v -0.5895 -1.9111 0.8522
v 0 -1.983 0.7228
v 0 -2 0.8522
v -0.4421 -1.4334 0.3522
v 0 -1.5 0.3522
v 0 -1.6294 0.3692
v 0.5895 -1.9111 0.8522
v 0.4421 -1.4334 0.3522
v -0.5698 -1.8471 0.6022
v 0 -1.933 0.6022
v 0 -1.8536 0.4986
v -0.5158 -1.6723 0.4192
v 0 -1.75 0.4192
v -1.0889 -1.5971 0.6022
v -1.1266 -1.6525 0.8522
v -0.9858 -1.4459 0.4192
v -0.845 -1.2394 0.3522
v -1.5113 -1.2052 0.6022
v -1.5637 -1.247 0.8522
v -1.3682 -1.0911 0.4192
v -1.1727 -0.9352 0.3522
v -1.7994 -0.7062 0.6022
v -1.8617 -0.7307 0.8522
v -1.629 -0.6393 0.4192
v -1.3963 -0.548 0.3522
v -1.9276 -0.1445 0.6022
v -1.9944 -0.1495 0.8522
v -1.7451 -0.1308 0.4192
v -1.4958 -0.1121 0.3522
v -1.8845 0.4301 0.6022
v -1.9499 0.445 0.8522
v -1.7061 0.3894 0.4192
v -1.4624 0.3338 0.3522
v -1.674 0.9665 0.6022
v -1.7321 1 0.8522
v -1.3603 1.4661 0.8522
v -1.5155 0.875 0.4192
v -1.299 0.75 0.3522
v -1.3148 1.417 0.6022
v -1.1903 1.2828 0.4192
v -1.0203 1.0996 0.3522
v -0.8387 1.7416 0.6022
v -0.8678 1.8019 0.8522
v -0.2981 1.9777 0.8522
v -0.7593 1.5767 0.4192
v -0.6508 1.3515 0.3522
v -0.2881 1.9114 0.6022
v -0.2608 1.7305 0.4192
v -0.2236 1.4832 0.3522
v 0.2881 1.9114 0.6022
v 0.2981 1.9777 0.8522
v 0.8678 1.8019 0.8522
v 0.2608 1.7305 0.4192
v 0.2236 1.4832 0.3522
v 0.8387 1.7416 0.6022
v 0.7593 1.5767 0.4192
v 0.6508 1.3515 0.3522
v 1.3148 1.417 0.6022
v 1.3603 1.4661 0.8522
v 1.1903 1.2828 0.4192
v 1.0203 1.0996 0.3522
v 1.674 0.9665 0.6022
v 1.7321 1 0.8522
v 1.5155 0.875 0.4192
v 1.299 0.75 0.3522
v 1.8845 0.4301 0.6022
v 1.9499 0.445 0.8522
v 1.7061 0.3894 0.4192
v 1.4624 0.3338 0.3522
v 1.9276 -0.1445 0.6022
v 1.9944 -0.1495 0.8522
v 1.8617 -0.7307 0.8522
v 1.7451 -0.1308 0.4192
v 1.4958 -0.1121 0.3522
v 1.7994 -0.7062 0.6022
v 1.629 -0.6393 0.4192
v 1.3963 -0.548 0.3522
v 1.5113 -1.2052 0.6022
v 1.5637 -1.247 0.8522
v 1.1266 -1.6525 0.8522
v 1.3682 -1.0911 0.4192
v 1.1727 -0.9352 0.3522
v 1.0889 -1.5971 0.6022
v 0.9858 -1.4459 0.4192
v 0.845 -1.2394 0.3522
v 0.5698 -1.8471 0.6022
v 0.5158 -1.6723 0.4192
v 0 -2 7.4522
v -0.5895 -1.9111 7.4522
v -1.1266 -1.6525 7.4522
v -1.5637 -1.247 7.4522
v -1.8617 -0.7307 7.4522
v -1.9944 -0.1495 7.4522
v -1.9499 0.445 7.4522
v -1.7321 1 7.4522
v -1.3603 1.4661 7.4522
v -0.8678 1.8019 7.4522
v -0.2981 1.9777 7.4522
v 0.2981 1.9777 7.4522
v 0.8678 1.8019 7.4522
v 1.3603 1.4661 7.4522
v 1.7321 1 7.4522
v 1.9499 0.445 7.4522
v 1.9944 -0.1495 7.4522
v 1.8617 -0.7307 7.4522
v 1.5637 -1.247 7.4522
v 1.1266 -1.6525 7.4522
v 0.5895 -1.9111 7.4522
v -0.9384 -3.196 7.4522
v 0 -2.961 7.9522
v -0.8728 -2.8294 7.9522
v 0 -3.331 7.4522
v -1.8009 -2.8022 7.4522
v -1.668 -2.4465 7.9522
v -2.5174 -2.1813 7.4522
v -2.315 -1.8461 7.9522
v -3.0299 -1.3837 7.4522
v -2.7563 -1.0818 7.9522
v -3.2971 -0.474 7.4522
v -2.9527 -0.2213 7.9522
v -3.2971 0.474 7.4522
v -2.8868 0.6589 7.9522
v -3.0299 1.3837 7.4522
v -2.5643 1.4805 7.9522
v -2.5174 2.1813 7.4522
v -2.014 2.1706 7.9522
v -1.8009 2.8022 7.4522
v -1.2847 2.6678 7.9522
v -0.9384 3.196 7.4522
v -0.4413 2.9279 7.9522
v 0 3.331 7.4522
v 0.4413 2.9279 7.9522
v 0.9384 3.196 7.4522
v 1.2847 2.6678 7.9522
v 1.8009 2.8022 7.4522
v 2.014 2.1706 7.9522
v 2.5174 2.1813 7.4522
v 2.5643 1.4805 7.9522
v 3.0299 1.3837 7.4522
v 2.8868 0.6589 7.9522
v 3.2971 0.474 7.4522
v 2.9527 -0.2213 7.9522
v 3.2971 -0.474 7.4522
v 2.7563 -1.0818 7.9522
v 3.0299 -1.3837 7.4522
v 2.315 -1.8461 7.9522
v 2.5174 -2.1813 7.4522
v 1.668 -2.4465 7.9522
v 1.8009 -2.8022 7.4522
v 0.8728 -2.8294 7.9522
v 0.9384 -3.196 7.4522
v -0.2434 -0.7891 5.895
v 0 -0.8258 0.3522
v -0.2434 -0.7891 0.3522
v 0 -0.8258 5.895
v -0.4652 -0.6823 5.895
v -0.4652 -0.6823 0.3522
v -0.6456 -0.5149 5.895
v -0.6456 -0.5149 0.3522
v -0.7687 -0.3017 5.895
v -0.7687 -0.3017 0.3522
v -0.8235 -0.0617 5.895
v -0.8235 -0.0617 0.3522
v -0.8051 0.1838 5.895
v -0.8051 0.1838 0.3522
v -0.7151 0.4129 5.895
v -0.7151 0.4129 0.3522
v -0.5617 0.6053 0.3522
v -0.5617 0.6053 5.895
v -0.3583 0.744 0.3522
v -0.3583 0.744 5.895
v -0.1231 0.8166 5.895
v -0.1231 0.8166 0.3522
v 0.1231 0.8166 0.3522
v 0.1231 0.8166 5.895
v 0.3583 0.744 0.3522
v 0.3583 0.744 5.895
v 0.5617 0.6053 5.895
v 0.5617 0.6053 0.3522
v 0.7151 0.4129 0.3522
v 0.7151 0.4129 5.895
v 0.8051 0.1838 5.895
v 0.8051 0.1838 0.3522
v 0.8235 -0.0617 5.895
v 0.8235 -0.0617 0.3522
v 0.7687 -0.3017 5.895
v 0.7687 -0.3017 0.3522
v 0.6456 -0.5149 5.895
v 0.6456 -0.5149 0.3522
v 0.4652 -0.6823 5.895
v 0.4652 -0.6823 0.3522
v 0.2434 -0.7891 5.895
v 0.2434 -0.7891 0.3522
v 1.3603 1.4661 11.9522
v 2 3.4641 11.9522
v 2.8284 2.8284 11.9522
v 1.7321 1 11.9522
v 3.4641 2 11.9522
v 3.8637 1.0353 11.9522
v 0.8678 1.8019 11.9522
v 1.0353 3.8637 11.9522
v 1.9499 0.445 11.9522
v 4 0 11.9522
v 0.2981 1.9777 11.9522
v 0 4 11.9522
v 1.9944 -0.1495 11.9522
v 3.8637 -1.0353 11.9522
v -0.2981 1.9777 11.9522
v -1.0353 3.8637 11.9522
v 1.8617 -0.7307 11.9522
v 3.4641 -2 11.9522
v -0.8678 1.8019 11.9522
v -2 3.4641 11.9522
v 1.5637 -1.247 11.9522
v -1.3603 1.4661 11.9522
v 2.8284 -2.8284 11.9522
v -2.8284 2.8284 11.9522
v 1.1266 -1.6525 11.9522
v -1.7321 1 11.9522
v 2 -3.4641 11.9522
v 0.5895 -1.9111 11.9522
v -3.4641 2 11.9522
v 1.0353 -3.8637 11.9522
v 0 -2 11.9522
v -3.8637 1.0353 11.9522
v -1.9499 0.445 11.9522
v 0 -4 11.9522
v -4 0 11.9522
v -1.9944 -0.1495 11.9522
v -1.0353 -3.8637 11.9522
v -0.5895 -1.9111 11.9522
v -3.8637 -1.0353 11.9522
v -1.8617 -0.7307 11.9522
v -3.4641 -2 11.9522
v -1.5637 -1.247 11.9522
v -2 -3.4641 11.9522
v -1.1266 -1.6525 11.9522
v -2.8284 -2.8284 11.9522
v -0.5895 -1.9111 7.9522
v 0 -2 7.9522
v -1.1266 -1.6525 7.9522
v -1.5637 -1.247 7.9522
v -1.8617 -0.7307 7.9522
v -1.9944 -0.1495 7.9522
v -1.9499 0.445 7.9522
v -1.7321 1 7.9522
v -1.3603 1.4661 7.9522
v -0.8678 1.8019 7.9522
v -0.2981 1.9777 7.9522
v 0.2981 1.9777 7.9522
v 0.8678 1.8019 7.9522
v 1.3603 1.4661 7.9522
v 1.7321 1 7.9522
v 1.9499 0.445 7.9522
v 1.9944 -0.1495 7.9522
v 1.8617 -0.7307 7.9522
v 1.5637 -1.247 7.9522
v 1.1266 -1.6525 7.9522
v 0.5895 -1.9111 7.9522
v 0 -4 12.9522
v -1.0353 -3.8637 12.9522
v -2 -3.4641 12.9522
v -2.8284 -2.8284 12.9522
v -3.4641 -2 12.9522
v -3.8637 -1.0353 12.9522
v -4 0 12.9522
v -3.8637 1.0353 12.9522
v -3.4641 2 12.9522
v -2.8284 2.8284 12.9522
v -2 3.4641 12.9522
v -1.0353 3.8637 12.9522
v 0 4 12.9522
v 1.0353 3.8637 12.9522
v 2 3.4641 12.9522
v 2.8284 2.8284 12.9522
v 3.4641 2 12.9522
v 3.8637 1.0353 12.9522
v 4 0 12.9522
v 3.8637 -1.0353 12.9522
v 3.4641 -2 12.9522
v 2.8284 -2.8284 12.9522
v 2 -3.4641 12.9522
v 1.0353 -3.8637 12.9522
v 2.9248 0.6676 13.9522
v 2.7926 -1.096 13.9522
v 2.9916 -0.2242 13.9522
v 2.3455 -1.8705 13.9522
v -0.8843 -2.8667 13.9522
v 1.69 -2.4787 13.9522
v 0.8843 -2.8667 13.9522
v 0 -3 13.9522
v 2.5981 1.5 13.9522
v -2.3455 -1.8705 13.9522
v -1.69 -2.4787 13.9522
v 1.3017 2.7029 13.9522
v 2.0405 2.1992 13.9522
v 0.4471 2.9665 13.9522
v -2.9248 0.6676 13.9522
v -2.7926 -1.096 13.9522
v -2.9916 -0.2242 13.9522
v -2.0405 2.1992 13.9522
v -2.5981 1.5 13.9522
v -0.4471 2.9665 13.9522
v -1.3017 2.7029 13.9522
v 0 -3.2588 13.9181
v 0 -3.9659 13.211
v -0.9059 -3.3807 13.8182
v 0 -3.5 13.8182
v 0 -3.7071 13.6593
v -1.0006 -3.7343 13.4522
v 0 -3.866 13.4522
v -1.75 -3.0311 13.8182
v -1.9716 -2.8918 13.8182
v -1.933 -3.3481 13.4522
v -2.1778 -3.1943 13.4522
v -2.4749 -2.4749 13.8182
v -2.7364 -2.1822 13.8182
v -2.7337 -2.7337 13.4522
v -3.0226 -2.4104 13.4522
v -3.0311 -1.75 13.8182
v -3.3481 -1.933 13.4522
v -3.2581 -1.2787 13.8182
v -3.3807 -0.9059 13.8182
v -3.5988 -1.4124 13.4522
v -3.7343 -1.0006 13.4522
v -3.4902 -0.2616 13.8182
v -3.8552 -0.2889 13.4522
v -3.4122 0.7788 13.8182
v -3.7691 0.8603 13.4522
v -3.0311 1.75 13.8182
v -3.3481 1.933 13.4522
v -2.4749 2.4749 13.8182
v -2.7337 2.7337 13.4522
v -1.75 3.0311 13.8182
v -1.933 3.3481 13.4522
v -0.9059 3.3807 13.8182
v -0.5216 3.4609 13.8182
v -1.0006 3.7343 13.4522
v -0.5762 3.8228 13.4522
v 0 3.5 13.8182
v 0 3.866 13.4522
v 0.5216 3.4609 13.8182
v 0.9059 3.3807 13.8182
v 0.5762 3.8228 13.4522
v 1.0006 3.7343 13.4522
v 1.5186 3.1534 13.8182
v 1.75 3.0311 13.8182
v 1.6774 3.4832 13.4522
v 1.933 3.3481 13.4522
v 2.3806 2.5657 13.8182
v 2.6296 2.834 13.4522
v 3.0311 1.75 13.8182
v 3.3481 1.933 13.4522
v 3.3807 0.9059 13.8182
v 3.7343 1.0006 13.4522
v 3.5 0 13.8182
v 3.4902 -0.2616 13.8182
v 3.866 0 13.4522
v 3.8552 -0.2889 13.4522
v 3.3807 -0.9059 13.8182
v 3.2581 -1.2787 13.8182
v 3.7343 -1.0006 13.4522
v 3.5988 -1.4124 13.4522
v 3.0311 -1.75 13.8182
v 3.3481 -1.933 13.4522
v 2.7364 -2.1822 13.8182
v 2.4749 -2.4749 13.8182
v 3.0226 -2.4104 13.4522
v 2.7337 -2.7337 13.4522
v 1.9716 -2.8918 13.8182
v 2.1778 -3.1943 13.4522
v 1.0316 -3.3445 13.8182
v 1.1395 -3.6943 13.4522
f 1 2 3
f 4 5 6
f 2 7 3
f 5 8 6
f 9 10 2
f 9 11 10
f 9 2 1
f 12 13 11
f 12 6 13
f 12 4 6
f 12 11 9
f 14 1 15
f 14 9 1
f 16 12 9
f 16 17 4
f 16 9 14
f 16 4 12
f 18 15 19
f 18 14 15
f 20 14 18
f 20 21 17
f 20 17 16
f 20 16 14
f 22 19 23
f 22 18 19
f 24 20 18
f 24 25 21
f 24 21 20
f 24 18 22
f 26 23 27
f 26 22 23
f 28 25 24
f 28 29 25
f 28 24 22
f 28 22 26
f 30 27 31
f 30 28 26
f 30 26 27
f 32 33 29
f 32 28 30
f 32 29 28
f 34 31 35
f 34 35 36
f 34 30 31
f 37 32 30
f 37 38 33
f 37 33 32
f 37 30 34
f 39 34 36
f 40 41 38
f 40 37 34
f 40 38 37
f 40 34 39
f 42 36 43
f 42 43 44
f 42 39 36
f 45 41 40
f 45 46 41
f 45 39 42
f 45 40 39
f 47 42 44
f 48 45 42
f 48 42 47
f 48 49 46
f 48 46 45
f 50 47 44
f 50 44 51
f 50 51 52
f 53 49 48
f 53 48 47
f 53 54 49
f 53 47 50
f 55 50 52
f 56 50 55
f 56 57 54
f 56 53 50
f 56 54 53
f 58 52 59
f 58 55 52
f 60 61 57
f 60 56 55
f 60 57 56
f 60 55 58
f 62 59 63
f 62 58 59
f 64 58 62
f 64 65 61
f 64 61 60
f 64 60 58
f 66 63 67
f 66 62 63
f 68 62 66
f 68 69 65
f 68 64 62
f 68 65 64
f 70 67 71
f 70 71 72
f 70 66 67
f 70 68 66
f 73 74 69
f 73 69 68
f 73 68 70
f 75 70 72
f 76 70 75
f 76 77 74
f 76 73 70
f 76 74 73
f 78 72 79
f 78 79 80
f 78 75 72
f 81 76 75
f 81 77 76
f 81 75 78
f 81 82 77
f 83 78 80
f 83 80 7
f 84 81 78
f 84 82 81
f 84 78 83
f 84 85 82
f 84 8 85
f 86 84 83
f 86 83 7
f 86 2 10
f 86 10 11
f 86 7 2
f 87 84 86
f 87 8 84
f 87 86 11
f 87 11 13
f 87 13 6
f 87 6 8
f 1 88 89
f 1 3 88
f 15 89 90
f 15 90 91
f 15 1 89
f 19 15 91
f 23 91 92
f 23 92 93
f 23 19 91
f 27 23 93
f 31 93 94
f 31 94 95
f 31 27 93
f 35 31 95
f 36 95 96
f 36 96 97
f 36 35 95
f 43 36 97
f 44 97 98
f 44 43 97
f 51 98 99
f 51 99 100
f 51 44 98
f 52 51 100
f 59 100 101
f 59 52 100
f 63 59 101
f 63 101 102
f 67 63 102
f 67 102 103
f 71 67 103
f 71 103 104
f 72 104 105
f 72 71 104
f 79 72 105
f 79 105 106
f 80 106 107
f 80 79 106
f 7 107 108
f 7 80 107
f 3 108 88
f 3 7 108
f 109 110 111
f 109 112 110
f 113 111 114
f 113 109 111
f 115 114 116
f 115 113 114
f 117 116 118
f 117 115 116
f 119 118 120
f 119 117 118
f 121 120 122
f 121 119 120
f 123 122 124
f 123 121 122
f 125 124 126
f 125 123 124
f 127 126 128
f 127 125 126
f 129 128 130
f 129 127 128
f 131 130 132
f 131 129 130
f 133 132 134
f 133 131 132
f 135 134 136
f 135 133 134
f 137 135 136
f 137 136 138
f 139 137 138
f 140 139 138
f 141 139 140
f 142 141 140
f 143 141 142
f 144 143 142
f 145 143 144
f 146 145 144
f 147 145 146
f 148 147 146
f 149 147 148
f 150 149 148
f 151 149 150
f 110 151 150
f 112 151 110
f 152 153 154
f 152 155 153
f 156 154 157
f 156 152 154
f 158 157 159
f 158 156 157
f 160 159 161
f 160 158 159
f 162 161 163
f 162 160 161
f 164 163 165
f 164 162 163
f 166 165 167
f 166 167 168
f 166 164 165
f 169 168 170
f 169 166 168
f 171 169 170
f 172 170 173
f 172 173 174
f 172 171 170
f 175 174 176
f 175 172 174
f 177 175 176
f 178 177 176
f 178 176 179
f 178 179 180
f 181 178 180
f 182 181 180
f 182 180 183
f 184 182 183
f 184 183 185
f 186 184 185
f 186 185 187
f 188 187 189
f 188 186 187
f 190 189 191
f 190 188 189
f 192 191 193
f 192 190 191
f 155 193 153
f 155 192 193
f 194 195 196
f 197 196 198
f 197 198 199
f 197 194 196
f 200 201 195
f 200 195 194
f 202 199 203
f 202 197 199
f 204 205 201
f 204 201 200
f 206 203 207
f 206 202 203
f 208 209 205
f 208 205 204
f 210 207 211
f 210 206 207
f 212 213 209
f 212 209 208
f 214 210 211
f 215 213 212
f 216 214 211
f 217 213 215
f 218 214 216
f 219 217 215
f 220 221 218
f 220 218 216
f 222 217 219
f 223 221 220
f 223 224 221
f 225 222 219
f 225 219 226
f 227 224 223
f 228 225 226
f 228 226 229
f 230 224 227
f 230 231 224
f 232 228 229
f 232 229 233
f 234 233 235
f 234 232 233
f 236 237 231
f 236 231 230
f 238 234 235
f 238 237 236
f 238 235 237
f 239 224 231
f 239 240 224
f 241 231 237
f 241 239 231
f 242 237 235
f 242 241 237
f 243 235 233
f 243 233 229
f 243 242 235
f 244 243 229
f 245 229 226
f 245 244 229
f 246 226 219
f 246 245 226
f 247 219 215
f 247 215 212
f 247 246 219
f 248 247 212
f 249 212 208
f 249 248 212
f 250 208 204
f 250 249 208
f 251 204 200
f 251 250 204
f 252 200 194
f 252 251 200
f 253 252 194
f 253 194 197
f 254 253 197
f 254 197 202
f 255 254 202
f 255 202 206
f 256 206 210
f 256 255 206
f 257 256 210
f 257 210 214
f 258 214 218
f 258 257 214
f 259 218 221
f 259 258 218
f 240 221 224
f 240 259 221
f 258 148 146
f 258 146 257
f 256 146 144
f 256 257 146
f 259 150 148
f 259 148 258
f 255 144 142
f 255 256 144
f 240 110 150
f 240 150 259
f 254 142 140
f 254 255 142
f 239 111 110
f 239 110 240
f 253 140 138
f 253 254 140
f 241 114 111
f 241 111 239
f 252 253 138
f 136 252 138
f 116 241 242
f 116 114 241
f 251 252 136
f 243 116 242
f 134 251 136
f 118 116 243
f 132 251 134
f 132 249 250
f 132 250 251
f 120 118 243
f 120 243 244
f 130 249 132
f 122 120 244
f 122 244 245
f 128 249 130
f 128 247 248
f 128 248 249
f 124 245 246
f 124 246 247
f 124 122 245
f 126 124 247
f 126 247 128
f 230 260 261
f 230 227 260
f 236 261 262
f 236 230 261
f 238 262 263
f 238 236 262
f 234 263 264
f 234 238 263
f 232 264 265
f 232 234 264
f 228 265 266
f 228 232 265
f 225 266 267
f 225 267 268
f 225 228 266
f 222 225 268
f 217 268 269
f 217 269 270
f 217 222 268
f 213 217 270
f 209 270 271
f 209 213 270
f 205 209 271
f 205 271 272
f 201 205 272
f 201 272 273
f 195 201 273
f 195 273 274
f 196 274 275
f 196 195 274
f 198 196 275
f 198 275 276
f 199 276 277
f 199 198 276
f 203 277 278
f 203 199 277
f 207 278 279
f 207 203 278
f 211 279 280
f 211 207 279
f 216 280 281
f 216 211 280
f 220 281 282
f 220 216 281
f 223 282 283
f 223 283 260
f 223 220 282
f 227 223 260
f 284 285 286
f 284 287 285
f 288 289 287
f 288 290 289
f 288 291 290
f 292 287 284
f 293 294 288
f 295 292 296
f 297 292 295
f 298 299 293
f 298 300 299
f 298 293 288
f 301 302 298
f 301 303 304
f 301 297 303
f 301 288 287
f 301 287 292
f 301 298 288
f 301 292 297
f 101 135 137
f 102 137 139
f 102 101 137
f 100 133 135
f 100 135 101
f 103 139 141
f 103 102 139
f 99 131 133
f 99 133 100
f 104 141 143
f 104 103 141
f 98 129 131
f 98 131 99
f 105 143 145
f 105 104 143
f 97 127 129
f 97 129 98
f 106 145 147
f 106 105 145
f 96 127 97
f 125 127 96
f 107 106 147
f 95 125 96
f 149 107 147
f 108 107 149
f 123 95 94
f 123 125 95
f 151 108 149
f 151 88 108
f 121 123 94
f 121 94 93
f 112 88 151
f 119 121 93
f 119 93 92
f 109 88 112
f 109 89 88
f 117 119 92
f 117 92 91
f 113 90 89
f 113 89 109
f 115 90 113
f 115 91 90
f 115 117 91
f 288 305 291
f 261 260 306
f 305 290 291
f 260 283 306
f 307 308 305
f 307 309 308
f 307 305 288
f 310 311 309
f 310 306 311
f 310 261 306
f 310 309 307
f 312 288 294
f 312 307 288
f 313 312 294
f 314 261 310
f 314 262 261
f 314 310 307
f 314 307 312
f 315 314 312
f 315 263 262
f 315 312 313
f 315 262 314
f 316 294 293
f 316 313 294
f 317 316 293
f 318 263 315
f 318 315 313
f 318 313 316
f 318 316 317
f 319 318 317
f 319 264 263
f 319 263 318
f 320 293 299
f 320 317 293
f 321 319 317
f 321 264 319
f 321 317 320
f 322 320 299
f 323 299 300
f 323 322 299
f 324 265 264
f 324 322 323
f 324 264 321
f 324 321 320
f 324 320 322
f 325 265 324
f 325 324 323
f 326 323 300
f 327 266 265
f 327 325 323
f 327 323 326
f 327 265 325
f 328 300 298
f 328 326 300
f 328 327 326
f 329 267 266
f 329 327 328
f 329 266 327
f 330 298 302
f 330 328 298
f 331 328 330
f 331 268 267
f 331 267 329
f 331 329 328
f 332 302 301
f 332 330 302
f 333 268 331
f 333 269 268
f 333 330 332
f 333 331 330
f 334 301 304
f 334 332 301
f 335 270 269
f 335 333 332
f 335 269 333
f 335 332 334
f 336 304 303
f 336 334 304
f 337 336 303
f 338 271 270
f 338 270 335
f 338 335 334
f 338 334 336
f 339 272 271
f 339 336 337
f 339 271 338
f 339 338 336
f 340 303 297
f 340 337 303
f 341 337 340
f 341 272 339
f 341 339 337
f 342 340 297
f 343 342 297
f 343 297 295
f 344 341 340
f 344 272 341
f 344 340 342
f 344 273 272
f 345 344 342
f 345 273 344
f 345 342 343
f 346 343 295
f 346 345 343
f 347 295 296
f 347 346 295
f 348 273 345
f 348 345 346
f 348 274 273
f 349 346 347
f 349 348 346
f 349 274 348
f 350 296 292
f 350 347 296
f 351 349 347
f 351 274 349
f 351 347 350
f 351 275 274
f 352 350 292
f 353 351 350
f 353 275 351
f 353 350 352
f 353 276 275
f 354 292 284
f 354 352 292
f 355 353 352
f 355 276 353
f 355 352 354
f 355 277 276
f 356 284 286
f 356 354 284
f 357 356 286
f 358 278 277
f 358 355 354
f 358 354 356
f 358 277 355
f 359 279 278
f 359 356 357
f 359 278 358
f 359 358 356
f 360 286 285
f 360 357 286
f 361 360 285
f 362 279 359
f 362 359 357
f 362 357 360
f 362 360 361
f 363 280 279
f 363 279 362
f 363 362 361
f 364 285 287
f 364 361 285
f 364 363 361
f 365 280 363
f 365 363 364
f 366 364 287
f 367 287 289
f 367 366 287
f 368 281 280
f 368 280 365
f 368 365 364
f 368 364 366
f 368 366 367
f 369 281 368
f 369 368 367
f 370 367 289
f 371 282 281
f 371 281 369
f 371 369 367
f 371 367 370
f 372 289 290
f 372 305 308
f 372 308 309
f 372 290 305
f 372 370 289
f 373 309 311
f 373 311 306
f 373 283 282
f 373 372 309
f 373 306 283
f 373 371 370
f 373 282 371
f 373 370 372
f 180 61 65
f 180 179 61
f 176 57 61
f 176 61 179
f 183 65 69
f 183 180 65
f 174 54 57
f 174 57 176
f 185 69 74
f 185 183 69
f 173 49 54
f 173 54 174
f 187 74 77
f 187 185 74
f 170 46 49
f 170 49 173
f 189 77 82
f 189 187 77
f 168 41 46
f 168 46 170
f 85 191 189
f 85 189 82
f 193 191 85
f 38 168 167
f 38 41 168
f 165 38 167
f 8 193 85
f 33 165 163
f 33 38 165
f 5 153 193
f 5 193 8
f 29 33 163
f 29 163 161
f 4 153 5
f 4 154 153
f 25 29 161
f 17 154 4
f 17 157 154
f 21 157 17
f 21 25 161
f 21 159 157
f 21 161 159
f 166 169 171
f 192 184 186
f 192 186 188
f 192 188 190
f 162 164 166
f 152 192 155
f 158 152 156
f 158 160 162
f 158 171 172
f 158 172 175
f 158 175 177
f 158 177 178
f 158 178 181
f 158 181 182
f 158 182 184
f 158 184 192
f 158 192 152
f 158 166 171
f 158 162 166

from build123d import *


with BuildPart() as f1:
    # F0 (on Right) → F1 (revolve)
    with BuildSketch(Plane.YZ):
        with BuildLine():
            Line((0, 5.89504), (0, 13.952179))
            Line((0, 13.952179), (-3, 13.952179))
            ThreePointArc((-3, 13.952179), (-3.707107, 13.659285), (-4, 12.952179))
            Line((-4, 12.952179), (-4, 11.952179))
            Line((-4, 11.952179), (-2, 11.952179))
            Line((-2, 11.952179), (-2, 7.952179))
            Line((-2, 7.952179), (-2.96099, 7.952179))
            Line((-2.96099, 7.952179), (-3.330959, 7.452179))
            Line((-3.330959, 7.452179), (-2, 7.452179))
            Line((-2, 7.452179), (-2, 0.852179))
            ThreePointArc((-2, 0.852179), (-1.853553, 0.498625), (-1.5, 0.352179))
            Line((-1.5, 0.352179), (-0.825782, 0.352179))
            Line((-0.825782, 0.352179), (-0.825782, 5.89504))
            Line((-0.825782, 5.89504), (0, 5.89504))
        make_face()
    revolve(axis=Axis((0, 0, 9.923609), (0, 0, -1)))


solid = f1.part
